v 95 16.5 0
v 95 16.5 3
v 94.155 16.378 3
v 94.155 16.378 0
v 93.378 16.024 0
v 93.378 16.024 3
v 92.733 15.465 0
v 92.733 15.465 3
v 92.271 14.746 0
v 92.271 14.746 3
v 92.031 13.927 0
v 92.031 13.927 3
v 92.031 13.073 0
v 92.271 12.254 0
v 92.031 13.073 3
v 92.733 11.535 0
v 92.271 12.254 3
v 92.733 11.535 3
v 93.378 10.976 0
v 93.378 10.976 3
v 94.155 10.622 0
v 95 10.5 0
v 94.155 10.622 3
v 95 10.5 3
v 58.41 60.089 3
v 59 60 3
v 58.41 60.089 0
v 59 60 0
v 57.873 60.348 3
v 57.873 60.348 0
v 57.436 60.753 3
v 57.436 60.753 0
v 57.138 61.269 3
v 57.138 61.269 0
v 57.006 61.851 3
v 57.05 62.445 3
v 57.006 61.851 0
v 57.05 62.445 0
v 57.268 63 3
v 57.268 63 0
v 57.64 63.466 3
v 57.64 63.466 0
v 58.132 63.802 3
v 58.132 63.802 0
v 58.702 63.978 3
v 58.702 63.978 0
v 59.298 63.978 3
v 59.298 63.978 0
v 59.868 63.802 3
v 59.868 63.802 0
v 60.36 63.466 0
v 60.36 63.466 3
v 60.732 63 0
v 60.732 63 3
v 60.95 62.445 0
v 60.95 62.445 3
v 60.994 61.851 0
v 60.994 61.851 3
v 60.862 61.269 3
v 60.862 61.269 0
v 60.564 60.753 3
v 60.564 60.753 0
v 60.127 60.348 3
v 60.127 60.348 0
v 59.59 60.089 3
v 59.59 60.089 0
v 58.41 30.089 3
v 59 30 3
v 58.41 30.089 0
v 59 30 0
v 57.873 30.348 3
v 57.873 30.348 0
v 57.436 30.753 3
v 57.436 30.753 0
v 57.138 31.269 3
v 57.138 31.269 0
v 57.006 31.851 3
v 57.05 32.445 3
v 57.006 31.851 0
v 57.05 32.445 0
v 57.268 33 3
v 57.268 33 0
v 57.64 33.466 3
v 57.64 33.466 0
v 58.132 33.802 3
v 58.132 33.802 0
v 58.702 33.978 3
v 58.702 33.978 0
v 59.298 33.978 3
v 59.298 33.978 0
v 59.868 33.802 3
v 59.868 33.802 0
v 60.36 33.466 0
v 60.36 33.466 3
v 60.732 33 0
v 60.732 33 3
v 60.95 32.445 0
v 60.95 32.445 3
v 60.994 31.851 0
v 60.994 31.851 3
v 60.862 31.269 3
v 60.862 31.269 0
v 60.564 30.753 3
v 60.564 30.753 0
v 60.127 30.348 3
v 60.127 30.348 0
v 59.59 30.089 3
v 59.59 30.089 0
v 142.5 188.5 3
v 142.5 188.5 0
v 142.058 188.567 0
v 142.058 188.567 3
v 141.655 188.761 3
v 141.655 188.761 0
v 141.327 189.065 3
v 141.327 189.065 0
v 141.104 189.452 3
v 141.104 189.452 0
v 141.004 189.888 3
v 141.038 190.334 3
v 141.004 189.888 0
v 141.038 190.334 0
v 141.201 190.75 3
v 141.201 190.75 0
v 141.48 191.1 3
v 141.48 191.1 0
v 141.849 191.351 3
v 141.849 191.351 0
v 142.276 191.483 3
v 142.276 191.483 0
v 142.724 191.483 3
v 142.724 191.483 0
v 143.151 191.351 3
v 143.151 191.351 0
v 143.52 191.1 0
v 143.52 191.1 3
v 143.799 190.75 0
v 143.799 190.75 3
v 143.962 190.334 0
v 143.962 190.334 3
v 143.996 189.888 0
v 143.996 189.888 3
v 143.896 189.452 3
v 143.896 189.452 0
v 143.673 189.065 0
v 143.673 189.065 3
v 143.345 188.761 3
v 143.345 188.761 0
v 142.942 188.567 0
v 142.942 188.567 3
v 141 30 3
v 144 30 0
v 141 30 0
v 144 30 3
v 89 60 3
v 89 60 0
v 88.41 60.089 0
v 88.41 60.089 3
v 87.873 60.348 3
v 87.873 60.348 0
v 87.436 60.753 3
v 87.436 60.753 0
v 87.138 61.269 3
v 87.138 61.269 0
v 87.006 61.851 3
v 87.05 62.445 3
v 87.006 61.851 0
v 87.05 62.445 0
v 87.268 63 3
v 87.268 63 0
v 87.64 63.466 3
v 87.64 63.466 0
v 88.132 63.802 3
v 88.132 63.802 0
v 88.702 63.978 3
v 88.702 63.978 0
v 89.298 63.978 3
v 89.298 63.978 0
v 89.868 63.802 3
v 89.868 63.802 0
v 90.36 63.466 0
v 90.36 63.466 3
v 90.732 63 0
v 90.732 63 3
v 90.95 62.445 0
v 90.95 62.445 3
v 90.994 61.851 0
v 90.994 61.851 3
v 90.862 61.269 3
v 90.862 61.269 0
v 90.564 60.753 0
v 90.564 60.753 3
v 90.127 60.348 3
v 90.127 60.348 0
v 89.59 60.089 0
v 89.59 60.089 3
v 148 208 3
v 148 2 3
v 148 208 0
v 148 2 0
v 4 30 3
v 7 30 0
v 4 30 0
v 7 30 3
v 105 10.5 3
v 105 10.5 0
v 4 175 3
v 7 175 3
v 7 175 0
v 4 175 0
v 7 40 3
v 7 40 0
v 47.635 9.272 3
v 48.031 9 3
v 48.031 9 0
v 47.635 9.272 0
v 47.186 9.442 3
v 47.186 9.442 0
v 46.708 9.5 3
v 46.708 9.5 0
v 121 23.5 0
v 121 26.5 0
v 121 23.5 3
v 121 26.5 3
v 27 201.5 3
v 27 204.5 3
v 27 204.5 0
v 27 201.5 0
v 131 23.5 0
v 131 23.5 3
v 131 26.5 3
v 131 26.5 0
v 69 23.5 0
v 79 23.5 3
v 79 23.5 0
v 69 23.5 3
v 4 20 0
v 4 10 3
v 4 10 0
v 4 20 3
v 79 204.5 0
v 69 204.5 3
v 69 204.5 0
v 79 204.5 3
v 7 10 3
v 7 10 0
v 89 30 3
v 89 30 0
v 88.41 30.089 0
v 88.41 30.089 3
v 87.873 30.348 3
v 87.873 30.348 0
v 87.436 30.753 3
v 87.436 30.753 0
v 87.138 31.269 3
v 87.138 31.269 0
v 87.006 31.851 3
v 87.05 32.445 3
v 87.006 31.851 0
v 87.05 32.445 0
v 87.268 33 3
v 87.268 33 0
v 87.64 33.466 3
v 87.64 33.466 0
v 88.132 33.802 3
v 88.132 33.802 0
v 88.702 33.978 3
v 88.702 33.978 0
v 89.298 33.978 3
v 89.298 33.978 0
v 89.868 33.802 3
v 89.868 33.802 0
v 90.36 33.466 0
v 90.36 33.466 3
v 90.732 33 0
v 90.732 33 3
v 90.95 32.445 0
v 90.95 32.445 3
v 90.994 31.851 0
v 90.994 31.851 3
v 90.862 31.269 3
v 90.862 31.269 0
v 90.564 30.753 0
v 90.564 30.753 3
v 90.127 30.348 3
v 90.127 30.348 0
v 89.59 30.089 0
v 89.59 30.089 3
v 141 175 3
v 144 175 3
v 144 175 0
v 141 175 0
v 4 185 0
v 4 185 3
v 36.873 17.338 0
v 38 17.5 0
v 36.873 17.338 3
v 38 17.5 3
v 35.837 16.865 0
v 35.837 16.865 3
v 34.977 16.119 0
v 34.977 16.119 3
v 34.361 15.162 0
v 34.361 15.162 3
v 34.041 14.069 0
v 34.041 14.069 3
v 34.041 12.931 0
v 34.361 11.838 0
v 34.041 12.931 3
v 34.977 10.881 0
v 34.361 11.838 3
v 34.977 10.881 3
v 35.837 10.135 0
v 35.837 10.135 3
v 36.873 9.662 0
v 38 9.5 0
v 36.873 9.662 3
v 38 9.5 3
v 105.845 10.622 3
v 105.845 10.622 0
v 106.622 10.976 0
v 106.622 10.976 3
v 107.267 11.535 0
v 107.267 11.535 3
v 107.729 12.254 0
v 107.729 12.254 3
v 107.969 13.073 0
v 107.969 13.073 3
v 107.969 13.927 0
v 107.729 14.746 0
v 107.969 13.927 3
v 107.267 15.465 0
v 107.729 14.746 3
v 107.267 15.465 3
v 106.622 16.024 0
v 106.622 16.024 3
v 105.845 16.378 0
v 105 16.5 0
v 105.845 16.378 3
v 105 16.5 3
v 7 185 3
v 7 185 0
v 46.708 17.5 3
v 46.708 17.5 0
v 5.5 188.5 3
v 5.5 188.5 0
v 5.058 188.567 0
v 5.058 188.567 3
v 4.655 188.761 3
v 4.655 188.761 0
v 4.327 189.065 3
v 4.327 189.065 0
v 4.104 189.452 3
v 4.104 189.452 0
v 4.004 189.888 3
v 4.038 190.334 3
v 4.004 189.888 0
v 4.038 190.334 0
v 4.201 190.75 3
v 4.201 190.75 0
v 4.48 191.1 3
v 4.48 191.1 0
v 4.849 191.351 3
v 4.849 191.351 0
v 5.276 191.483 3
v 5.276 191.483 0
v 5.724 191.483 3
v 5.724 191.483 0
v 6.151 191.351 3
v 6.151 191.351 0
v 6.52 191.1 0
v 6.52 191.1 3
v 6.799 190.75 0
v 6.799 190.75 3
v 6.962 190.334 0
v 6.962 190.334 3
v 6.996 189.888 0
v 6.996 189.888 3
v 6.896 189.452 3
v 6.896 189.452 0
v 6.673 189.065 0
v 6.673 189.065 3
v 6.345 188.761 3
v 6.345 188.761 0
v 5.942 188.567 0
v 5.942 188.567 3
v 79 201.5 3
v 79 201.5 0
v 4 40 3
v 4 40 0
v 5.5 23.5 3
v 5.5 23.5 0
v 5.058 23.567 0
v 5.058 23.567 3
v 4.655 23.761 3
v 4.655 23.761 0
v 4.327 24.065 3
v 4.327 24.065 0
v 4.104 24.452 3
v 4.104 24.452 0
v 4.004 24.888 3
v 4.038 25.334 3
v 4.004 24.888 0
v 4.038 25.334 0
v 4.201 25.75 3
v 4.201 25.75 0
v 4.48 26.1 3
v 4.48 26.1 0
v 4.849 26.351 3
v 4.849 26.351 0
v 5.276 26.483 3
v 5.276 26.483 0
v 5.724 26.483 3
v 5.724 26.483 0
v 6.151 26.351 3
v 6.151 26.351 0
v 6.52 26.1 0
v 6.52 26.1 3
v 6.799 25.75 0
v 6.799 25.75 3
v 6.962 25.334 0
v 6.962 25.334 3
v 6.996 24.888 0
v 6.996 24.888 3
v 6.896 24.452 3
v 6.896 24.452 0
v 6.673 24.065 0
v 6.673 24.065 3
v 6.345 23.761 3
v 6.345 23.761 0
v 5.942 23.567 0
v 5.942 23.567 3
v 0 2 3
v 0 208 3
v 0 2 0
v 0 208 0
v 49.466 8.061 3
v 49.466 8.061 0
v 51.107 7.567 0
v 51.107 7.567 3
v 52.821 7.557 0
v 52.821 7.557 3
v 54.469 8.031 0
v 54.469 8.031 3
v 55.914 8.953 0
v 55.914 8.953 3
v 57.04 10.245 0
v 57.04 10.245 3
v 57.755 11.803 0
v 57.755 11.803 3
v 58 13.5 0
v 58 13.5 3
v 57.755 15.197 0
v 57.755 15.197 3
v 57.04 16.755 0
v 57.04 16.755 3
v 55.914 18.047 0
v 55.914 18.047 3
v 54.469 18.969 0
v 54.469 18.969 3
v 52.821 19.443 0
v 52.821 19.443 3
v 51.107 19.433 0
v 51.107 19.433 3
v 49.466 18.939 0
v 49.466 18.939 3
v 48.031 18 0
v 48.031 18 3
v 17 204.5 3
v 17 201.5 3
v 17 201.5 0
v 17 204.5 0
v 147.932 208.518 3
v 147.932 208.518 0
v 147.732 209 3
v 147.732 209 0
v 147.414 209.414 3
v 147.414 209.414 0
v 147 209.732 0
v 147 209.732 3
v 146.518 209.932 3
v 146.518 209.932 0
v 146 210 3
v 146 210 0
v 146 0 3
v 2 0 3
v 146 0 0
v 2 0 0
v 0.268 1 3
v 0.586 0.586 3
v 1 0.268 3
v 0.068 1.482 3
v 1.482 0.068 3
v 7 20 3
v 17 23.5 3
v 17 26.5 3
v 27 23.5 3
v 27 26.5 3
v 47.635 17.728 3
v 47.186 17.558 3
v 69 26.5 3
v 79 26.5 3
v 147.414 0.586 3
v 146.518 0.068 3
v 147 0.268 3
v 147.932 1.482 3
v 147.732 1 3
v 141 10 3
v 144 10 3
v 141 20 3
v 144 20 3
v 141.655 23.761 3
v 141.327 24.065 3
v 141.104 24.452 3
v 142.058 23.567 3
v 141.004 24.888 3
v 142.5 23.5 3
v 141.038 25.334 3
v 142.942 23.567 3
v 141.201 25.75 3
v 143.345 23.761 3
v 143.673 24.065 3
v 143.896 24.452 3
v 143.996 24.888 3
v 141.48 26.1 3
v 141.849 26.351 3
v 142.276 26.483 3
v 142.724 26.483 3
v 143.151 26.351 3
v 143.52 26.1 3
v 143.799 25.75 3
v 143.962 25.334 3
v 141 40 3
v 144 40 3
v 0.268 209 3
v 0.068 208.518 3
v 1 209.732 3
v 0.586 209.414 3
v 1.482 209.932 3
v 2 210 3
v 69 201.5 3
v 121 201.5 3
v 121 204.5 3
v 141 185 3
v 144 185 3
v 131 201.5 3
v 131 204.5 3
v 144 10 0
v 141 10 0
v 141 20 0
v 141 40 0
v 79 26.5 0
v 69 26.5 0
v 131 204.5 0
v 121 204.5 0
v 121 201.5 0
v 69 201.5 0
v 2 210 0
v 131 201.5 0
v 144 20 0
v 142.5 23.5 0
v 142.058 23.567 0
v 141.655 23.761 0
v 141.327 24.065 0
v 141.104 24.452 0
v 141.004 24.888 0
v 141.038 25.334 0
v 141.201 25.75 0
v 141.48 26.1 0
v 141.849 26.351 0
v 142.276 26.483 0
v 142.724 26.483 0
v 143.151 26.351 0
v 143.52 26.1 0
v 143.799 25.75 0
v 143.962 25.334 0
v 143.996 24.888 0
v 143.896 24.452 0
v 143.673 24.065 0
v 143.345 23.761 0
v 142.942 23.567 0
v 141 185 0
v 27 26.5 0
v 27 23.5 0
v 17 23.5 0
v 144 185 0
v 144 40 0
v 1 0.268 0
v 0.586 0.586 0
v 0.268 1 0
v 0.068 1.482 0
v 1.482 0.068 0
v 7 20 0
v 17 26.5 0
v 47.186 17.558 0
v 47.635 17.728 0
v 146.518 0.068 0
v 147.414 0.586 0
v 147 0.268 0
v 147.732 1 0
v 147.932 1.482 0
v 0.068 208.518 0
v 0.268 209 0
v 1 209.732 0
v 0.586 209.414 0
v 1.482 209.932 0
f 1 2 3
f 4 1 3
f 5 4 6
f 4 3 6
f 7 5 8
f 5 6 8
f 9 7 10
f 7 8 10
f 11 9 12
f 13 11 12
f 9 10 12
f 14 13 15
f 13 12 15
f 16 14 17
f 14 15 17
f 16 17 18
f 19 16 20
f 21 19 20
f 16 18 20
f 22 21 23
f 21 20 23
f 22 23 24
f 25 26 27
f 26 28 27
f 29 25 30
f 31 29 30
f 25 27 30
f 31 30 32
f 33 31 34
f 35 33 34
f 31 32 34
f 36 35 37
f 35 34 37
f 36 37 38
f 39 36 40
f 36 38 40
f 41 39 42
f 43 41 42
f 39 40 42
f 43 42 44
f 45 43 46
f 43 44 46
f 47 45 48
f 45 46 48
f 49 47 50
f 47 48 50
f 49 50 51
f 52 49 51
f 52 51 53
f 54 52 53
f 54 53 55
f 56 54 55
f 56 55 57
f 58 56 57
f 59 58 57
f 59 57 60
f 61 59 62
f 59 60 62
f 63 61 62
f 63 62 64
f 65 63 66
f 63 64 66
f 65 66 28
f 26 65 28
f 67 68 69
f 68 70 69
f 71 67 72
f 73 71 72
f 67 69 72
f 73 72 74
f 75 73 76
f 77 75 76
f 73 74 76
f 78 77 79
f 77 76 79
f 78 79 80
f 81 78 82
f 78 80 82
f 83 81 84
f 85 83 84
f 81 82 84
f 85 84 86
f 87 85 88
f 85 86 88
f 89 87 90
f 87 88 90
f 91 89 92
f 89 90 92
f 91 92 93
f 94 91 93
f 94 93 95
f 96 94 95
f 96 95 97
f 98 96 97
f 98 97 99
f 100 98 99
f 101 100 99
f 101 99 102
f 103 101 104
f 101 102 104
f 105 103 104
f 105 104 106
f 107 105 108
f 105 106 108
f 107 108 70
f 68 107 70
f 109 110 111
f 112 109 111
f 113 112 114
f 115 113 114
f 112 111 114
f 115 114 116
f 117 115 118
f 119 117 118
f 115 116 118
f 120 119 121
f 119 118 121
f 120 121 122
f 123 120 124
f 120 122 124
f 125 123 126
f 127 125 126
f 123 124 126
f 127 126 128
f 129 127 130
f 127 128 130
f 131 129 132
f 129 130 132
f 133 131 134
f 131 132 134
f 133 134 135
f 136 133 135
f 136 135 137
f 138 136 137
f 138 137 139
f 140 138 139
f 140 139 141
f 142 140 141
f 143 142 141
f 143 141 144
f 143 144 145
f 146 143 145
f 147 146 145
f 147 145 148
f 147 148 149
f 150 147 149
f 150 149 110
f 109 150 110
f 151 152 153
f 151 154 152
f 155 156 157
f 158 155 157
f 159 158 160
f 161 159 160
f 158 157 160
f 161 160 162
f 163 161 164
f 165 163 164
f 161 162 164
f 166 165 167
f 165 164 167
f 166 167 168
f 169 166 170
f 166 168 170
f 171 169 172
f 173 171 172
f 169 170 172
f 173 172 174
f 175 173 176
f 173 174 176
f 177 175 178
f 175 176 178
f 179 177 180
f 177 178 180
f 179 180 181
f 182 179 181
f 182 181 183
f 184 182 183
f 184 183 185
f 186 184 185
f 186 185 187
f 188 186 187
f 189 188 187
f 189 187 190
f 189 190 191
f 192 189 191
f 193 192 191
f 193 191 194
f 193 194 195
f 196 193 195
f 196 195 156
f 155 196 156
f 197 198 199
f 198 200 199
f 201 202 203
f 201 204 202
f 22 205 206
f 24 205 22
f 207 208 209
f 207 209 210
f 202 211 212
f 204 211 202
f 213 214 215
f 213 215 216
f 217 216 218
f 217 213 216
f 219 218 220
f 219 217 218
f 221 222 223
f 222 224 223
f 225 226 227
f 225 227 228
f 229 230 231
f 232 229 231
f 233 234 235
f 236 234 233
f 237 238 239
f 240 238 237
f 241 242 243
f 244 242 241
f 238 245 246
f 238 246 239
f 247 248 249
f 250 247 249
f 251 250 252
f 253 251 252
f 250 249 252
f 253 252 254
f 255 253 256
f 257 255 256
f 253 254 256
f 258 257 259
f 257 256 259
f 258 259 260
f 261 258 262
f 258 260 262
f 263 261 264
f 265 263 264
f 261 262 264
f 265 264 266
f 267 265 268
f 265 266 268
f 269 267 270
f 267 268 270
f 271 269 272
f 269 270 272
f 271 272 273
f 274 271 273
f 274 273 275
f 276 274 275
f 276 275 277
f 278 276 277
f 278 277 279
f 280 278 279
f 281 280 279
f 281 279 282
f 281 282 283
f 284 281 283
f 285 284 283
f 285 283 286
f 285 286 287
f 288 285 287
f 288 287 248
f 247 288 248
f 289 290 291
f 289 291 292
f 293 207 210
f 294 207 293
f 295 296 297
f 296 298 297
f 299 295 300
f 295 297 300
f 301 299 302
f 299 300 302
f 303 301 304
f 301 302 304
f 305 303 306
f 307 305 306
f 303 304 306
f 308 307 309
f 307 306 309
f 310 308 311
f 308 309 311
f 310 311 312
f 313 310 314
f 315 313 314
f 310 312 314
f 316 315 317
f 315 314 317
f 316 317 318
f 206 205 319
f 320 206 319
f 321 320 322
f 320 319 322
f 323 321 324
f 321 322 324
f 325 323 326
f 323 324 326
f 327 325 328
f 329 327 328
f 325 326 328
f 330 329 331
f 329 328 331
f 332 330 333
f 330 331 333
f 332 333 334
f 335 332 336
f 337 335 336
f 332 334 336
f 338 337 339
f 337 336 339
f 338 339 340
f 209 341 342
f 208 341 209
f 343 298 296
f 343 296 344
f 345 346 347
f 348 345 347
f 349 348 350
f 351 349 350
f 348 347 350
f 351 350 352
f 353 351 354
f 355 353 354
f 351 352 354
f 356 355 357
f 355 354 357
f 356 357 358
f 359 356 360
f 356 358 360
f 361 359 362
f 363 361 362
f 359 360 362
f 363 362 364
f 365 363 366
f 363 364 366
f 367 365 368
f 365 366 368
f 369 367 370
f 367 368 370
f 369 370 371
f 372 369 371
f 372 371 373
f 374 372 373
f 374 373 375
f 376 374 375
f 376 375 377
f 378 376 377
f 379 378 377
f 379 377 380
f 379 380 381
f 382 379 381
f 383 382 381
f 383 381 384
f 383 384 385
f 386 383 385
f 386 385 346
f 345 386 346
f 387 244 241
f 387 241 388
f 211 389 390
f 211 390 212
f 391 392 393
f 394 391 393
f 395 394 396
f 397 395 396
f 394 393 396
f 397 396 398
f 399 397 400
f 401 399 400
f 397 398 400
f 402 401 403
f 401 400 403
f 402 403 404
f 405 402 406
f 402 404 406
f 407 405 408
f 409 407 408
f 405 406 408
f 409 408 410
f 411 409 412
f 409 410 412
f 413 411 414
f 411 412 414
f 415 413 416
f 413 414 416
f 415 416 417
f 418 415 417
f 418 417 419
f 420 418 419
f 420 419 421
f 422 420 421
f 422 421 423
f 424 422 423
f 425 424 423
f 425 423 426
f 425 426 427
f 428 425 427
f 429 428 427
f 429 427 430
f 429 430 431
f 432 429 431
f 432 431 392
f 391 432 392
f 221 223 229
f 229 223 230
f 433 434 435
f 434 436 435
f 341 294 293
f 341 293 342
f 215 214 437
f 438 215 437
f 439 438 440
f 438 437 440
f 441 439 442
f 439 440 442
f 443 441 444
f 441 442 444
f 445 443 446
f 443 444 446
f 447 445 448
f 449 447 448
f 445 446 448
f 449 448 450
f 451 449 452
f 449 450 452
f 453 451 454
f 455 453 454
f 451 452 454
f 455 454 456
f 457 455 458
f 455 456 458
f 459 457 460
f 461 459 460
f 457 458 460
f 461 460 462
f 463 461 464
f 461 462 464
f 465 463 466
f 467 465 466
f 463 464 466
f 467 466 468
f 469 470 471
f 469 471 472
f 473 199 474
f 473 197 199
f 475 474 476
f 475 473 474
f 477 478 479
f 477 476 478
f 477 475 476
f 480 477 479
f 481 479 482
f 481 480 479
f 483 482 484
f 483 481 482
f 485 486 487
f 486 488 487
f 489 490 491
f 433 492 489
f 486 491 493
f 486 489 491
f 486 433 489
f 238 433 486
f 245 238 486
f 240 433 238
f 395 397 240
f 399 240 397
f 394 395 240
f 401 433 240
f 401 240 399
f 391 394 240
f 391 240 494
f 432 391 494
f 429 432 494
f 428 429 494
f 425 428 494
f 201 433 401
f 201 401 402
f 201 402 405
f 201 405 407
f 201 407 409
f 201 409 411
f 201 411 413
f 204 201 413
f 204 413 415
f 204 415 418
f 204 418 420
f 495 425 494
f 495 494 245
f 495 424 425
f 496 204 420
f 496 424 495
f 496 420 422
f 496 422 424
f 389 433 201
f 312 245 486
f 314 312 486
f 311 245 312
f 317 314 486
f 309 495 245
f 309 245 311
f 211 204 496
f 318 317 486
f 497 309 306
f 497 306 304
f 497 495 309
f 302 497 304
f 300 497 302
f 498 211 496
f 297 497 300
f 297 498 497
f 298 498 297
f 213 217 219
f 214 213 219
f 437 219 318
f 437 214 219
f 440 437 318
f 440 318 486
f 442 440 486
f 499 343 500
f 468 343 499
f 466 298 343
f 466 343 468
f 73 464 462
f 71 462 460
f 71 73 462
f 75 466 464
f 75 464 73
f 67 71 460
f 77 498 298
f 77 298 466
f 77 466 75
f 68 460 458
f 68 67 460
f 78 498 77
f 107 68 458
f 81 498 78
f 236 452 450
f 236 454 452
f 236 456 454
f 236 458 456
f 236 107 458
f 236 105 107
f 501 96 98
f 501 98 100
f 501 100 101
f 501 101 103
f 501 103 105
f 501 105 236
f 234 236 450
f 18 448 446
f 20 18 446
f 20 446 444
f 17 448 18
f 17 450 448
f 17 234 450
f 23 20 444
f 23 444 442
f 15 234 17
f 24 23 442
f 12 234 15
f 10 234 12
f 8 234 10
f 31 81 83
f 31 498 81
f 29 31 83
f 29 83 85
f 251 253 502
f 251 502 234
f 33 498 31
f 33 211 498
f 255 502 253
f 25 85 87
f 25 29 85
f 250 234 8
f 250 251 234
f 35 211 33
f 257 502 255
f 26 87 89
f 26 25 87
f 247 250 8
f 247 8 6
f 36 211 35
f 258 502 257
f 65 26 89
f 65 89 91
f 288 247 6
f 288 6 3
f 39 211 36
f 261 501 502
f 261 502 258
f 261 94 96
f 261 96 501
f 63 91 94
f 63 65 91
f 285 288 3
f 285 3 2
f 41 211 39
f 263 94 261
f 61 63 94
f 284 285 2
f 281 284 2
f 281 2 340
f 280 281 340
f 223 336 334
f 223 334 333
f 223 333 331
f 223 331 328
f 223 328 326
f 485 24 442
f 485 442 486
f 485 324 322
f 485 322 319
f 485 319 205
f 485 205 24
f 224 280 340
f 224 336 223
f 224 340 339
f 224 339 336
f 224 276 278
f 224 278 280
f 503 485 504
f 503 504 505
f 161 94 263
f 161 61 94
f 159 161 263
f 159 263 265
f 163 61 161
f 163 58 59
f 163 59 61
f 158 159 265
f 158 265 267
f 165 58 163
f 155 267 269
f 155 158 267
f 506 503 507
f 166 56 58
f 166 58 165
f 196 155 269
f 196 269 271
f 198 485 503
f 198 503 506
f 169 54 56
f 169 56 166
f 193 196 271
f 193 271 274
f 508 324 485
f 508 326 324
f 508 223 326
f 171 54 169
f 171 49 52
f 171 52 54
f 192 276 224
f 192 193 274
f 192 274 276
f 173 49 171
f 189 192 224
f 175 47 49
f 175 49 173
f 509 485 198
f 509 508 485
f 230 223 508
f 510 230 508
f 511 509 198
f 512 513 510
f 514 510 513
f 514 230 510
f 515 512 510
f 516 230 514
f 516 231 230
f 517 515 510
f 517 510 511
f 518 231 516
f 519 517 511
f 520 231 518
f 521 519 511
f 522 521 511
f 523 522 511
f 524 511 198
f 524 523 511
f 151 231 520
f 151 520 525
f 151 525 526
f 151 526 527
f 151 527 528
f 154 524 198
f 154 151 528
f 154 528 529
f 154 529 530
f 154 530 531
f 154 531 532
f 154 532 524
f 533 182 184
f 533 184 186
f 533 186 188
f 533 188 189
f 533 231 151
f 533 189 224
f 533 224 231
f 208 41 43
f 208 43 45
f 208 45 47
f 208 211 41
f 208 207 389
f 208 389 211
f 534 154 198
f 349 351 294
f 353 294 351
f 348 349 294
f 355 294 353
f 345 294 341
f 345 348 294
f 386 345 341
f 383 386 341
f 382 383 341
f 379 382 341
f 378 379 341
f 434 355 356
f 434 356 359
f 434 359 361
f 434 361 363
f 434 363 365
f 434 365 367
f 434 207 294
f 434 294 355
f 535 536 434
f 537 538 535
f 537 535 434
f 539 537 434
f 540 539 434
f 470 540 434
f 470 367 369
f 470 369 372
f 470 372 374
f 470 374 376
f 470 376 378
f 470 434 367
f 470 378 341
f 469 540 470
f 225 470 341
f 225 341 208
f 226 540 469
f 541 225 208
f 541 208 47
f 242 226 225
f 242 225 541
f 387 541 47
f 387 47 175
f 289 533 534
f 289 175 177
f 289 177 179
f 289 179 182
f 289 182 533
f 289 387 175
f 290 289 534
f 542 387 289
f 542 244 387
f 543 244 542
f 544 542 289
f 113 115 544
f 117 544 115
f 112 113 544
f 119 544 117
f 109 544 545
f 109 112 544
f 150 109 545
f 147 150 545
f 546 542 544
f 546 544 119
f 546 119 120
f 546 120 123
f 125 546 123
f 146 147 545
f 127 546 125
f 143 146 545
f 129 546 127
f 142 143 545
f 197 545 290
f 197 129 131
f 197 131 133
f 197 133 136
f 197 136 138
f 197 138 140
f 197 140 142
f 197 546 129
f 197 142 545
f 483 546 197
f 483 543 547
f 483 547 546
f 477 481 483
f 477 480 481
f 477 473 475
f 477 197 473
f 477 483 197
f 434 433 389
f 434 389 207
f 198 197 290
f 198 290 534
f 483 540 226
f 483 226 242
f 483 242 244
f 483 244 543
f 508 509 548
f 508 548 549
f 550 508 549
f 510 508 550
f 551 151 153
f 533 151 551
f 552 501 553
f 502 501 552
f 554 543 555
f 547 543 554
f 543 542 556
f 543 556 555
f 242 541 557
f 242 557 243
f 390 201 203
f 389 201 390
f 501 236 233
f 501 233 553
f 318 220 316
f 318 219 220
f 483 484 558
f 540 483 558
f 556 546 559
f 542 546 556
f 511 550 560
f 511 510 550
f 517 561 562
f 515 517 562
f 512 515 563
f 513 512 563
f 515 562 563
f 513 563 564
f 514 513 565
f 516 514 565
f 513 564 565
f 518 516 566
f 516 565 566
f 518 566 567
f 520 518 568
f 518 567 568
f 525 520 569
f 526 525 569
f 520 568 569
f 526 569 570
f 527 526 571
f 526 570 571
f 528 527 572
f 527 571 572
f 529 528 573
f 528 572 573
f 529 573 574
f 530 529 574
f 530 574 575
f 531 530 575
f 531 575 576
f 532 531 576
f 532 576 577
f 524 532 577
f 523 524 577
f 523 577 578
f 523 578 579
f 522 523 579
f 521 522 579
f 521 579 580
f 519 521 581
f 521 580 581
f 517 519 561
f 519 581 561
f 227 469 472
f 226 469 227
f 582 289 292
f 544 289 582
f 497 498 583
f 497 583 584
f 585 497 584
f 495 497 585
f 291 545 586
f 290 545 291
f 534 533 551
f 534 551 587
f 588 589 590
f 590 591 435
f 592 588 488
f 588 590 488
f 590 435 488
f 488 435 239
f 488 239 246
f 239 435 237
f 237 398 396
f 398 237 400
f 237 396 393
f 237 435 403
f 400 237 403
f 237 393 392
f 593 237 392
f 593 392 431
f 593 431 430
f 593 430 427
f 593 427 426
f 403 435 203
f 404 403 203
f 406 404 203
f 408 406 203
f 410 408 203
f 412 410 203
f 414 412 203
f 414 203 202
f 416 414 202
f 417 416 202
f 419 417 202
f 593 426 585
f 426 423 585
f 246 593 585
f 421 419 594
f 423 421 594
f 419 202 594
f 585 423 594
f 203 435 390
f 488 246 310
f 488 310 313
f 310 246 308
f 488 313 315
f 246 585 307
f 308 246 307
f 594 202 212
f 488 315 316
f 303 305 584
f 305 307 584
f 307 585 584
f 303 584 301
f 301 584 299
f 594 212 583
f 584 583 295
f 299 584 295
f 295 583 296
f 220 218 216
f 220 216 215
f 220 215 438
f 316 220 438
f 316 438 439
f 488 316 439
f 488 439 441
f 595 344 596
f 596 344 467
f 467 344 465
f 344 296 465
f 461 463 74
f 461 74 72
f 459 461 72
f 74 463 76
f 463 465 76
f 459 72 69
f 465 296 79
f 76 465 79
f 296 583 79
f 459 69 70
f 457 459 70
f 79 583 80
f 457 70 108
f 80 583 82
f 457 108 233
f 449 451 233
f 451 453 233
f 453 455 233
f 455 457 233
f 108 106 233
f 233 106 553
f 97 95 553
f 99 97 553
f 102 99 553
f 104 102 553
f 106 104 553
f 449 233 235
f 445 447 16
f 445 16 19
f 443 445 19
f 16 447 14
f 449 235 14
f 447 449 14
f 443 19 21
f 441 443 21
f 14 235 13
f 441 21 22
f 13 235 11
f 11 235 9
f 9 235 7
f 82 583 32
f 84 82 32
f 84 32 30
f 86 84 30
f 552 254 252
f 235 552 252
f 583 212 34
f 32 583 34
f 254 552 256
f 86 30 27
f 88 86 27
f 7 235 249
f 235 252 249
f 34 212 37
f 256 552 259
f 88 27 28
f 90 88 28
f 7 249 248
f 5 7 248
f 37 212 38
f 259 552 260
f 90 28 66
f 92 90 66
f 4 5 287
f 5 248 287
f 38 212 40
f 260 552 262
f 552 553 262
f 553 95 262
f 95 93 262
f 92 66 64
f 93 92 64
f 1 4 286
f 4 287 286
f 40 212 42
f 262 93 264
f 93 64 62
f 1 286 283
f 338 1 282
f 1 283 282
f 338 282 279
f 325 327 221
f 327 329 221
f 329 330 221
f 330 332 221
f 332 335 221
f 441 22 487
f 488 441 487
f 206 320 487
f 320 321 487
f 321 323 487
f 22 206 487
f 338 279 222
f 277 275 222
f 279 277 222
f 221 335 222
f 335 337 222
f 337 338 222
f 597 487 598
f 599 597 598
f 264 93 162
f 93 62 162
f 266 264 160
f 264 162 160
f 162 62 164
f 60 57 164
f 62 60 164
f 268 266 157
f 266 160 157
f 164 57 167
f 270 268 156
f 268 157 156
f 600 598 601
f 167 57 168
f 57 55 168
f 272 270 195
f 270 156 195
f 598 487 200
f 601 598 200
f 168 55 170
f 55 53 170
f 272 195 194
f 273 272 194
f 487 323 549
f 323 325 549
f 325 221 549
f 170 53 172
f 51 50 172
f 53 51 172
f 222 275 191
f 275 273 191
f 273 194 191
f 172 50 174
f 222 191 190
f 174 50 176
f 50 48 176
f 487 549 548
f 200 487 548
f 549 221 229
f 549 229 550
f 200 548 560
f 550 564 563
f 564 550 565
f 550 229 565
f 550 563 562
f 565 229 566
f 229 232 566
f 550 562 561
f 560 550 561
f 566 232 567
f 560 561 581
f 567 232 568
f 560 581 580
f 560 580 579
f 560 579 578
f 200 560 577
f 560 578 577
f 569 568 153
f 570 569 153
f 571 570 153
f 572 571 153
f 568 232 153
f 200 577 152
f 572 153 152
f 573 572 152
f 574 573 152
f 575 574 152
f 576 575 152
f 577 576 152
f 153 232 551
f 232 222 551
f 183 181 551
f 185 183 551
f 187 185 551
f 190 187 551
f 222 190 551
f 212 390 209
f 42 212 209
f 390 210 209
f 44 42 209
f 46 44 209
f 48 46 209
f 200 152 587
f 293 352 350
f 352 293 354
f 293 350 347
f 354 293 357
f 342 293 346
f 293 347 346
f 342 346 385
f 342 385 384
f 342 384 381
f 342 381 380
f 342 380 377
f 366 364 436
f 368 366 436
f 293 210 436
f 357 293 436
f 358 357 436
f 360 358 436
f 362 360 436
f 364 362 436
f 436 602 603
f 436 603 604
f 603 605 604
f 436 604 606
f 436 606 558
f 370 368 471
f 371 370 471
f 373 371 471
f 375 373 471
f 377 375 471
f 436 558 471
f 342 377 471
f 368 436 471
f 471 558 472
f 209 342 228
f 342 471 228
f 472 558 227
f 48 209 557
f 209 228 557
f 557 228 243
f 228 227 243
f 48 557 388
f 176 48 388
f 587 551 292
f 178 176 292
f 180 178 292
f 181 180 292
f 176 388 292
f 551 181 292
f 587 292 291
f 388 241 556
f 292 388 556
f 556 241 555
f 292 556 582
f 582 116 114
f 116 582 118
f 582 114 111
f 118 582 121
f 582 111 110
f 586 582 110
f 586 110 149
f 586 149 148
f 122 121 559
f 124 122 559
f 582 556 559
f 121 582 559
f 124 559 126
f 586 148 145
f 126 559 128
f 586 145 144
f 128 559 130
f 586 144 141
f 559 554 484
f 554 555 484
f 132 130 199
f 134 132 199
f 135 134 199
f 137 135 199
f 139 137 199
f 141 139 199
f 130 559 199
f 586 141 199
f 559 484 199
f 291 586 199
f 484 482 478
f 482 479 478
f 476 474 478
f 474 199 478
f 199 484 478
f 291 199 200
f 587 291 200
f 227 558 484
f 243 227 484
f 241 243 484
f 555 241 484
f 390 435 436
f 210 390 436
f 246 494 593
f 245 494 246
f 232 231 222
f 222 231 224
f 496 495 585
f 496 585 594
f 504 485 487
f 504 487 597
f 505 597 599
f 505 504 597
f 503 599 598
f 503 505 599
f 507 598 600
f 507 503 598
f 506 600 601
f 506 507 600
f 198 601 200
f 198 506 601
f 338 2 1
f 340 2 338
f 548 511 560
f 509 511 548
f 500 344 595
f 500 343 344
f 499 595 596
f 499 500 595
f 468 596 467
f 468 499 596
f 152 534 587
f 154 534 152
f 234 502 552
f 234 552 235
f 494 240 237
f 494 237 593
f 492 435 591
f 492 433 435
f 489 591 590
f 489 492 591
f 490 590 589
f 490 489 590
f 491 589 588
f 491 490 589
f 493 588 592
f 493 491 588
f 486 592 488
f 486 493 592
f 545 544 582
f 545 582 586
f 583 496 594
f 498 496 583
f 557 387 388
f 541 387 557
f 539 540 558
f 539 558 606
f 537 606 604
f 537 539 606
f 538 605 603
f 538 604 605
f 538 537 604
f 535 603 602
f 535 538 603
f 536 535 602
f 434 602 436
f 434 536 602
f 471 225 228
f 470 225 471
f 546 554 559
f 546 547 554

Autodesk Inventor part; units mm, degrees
ref_plane "YZ Plane" through (0, 0, 0) normal (1, 0, 0) x (0, 1, 0)
ref_plane "XZ Plane" through (0, 0, 0) normal (0, 1, 0) x (-1, 0, 0)
ref_plane "XY Plane" through (0, 0, 0) normal (0, 0, 1) x (1, 0, 0)
sketch "Sketch1" plane through (0, 0, 0) normal (0, 0, 1) x (1, 0, 0)
  line L0 (0, 0) -> (148, 0)
  line L1 (148, 0) -> (148, 210)
  line L2 (148, 210) -> (0, 210)
  line L3 (0, 210) -> (0, 0)
  dimension "d0" = 148
  dimension "d1" = 210
extrude "Extrusion1" add sketch "Sketch1" along normal blind 3
sketch "Sketch2" plane through (0, 0, 3) normal (0, 0, 1) x (1, 0, 0)
  line L0 (0, 0) -> (0, 210) projected
  line L1 (148, 0) -> (0, 0) projected
  line L2 (148, 210) -> (148, 0) projected
  line L3 (0, 210) -> (148, 210) projected
  line L4 (4, 185) -> (7, 185)
  line L5 (7, 185) -> (7, 175)
  line L6 (7, 175) -> (4, 175)
  line L7 (4, 175) -> (4, 185)
  line L8 (4, 40) -> (7, 40)
  line L9 (7, 40) -> (7, 30)
  line L10 (7, 30) -> (4, 30)
  line L11 (4, 30) -> (4, 40)
  line L12 (4, 20) -> (7, 20)
  line L13 (7, 20) -> (7, 10)
  line L14 (7, 10) -> (4, 10)
  line L15 (4, 10) -> (4, 20)
  line L16 (141, 185) -> (144, 185)
  line L17 (144, 185) -> (144, 175)
  line L18 (144, 175) -> (141, 175)
  line L19 (141, 175) -> (141, 185)
  line L20 (141, 40) -> (144, 40)
  line L21 (144, 40) -> (144, 30)
  line L22 (144, 30) -> (141, 30)
  line L23 (141, 30) -> (141, 40)
  line L24 (141, 20) -> (144, 20)
  line L25 (144, 20) -> (144, 10)
  line L26 (144, 10) -> (141, 10)
  line L27 (141, 10) -> (141, 20)
  dimension "d8" = 10
  dimension "d10" = 10
  dimension "d11" = 10
  dimension "d12" = 10
  dimension "d13" = 10
  dimension "d16" = 10
  dimension "d17" = 10
  dimension "d18" = 10
  dimension "d19" = 10
  dimension "d43" = 4
  dimension "d44" = 4
  dimension "d45" = 3
  dimension "d46" = 3
  dimension "d47" = 4
  dimension "d48" = 3
  dimension "d49" = 3
  dimension "d50" = 4
  dimension "d51" = 4
  dimension "d52" = 3
  dimension "d194" = 25
  dimension "d195" = 25
extrude "Extrusion2" cut sketch "Sketch2" against normal through all contours L4 L5 L6 L7 | L8 L9 L10 L11 | L12 L13 L14 L15 | L16 L17 L18 L19 | L20 L21 L22 L23 | L24 L25 L26 L27
sketch "Sketch3" plane through (0, 0, 3) normal (0, 0, 1) x (1, 0, 0)
  line L0 (7, 30) -> (4, 30) projected
  line L1 (7, 20) -> (7, 10) projected
  line L2 (0, 210) -> (148, 210) projected
  line L3 (7, 185) -> (7, 175) projected
  line L4 (141, 175) -> (141, 185) projected
  point P0 (5.5, 190)
  point P1 (142.5, 190)
  point P2 (5.5, 25)
  point P3 (142.5, 25)
  point P4 (141, 30)
  dimension "d24" = 5
  dimension "d54" = 1.5
  dimension "d189" = 1.5
  dimension "d192" = 20
  dimension "d193" = 20
  dimension "d196" = 1.5
  dimension "d197" = 1.5
hole "Hole1" at (5.5, 190, 3) at (142.5, 190, 3) at (5.5, 25, 3) at (142.5, 25, 3) direction (0, 0, -1) diameter 3 end through all
fillet "Fillet1" radius 2 4 edges at (0, 0, 1.5) (148, 0, 1.5) (0, 210, 1.5) (148, 210, 1.5)
sketch "Sketch4" plane through (0, 0, 3) normal (0, 0, 1) x (1, 0, 0)
  line L0 (7, 20) -> (7, 10) projected
  line L1 (141, 10) -> (141, 20) projected
  line L2 (146, 0) -> (2, 0) projected
  line L3 (17, 26.5) -> (27, 26.5)
  line L4 (27, 26.5) -> (27, 23.5)
  line L5 (27, 23.5) -> (17, 23.5)
  line L6 (17, 23.5) -> (17, 26.5)
  line L7 (121, 23.5) -> (131, 23.5)
  line L8 (131, 23.5) -> (131, 26.5)
  line L9 (131, 26.5) -> (121, 26.5)
  line L10 (121, 26.5) -> (121, 23.5)
  line L11 (2, 210) -> (146, 210) projected
  line L12 (17, 204.5) -> (27, 204.5)
  line L13 (27, 204.5) -> (27, 201.5)
  line L14 (27, 201.5) -> (17, 201.5)
  line L15 (17, 201.5) -> (17, 204.5)
  line L16 (121, 204.5) -> (131, 204.5)
  line L17 (131, 204.5) -> (131, 201.5)
  line L18 (131, 201.5) -> (121, 201.5)
  line L19 (121, 201.5) -> (121, 204.5)
  line L20 (69, 26.5) -> (79, 26.5)
  line L21 (79, 26.5) -> (79, 23.5)
  line L22 (79, 23.5) -> (69, 23.5)
  line L23 (69, 23.5) -> (69, 26.5)
  line L24 (69, 204.5) -> (79, 204.5)
  line L25 (79, 204.5) -> (79, 201.5)
  line L26 (79, 201.5) -> (69, 201.5)
  line L27 (69, 201.5) -> (69, 204.5)
  line L28 (7, 185) -> (7, 175) projected
  line L29 (141, 175) -> (141, 185) projected
  dimension "d33" = 10
  dimension "d34" = 23.5
  dimension "d35" = 3
  dimension "d36" = 10
  dimension "d37" = 3
  dimension "d39" = 10
  dimension "d40" = 10
  dimension "d82" = 10
  dimension "d83" = 3
  dimension "d84" = 5.5
  dimension "d85" = 10
  dimension "d86" = 42
  dimension "d89" = 10
  dimension "d90" = 10
  dimension "d91" = 42
  dimension "d92" = 5.5
  dimension "d93" = 3
  dimension "d198" = 10
  dimension "d199" = 10
extrude "Extrusion3" cut sketch "Sketch4" against normal through all
sketch "草圖15" plane through (0, 0, 3) normal (0, 0, 1) x (1, 0, 0)
  line L0 (0, 2) -> (0, 208) projected
  line L1 (146, 0) -> (2, 0) projected
  line L2 (148, 208) -> (148, 2) projected
  line L3 (95, 16.5) -> (105, 16.5)
  line L4 (108, 13.5) -> (108, 13.5)
  line L5 (105, 10.5) -> (95, 10.5)
  line L6 (92, 13.5) -> (92, 13.5)
  arc A0 (108, 13.5) -> (105, 16.5) centre (105, 13.5) ccw
  arc A1 (105, 10.5) -> (108, 13.5) centre (105, 13.5) ccw
  arc A2 (92, 13.5) -> (95, 10.5) centre (95, 13.5) ccw
  arc A3 (95, 16.5) -> (92, 13.5) centre (95, 13.5) ccw
  arc A4 (48.0314, 9) -> (48.0314, 18) centre (52, 13.5) ccw
  line L7 (38, 17.5) -> (46.7085, 17.5)
  line L8 (46.7085, 9.5) -> (38, 9.5)
  line L9 (34, 13.5) -> (34, 13.5)
  arc A5 (38, 17.5) -> (34, 13.5) centre (38, 13.5) ccw
  arc A6 (34, 13.5) -> (38, 9.5) centre (38, 13.5) ccw
  arc A7 (46.7085, 17.5) -> (48.0314, 18) centre (46.7085, 19.5) ccw
  arc A8 (48.0314, 9) -> (46.7085, 9.5) centre (46.7085, 7.5) ccw
  point P0 (0, 0)
  point P1 (92, 16.5)
  point P2 (108, 16.5)
  point P3 (92, 10.5)
  point P4 (34, 17.5)
  point P5 (34, 9.5)
  point P6 (47.5279, 17.5)
  point P7 (47.5279, 9.5)
  dimension "d159" = 16
  dimension "d161" = 6
  dimension "d163" = 40
  dimension "d164" = 3
  dimension "d165" = 12
  dimension "d166" = 13.5
  dimension "d167" = 13.5
  dimension "d168" = 52
  dimension "d169" = 8
  dimension "d173" = 4
  dimension "d174" = 2
extrude "擠出8" cut sketch "草圖15" against normal through all
sketch "草圖16" plane through (0, 0, 3) normal (0, 0, 1) x (1, 0, 0)
  line L0 (0, 2) -> (0, 208) projected
  line L1 (146, 0) -> (2, 0) projected
  point P0 (0, 0)
  point P1 (59, 32)
  point P2 (89, 32)
  point P3 (59, 62)
  point P4 (89, 62)
  dimension "d177" = 32
  dimension "d178" = 30
  dimension "d180" = 59
  dimension "d181" = 30
hole "孔7" at (59, 32, 3) at (89, 32, 3) at (59, 62, 3) at (89, 62, 3) direction (0, 0, -1) diameter 4 end through all
properties part number "plastic_part_1"
